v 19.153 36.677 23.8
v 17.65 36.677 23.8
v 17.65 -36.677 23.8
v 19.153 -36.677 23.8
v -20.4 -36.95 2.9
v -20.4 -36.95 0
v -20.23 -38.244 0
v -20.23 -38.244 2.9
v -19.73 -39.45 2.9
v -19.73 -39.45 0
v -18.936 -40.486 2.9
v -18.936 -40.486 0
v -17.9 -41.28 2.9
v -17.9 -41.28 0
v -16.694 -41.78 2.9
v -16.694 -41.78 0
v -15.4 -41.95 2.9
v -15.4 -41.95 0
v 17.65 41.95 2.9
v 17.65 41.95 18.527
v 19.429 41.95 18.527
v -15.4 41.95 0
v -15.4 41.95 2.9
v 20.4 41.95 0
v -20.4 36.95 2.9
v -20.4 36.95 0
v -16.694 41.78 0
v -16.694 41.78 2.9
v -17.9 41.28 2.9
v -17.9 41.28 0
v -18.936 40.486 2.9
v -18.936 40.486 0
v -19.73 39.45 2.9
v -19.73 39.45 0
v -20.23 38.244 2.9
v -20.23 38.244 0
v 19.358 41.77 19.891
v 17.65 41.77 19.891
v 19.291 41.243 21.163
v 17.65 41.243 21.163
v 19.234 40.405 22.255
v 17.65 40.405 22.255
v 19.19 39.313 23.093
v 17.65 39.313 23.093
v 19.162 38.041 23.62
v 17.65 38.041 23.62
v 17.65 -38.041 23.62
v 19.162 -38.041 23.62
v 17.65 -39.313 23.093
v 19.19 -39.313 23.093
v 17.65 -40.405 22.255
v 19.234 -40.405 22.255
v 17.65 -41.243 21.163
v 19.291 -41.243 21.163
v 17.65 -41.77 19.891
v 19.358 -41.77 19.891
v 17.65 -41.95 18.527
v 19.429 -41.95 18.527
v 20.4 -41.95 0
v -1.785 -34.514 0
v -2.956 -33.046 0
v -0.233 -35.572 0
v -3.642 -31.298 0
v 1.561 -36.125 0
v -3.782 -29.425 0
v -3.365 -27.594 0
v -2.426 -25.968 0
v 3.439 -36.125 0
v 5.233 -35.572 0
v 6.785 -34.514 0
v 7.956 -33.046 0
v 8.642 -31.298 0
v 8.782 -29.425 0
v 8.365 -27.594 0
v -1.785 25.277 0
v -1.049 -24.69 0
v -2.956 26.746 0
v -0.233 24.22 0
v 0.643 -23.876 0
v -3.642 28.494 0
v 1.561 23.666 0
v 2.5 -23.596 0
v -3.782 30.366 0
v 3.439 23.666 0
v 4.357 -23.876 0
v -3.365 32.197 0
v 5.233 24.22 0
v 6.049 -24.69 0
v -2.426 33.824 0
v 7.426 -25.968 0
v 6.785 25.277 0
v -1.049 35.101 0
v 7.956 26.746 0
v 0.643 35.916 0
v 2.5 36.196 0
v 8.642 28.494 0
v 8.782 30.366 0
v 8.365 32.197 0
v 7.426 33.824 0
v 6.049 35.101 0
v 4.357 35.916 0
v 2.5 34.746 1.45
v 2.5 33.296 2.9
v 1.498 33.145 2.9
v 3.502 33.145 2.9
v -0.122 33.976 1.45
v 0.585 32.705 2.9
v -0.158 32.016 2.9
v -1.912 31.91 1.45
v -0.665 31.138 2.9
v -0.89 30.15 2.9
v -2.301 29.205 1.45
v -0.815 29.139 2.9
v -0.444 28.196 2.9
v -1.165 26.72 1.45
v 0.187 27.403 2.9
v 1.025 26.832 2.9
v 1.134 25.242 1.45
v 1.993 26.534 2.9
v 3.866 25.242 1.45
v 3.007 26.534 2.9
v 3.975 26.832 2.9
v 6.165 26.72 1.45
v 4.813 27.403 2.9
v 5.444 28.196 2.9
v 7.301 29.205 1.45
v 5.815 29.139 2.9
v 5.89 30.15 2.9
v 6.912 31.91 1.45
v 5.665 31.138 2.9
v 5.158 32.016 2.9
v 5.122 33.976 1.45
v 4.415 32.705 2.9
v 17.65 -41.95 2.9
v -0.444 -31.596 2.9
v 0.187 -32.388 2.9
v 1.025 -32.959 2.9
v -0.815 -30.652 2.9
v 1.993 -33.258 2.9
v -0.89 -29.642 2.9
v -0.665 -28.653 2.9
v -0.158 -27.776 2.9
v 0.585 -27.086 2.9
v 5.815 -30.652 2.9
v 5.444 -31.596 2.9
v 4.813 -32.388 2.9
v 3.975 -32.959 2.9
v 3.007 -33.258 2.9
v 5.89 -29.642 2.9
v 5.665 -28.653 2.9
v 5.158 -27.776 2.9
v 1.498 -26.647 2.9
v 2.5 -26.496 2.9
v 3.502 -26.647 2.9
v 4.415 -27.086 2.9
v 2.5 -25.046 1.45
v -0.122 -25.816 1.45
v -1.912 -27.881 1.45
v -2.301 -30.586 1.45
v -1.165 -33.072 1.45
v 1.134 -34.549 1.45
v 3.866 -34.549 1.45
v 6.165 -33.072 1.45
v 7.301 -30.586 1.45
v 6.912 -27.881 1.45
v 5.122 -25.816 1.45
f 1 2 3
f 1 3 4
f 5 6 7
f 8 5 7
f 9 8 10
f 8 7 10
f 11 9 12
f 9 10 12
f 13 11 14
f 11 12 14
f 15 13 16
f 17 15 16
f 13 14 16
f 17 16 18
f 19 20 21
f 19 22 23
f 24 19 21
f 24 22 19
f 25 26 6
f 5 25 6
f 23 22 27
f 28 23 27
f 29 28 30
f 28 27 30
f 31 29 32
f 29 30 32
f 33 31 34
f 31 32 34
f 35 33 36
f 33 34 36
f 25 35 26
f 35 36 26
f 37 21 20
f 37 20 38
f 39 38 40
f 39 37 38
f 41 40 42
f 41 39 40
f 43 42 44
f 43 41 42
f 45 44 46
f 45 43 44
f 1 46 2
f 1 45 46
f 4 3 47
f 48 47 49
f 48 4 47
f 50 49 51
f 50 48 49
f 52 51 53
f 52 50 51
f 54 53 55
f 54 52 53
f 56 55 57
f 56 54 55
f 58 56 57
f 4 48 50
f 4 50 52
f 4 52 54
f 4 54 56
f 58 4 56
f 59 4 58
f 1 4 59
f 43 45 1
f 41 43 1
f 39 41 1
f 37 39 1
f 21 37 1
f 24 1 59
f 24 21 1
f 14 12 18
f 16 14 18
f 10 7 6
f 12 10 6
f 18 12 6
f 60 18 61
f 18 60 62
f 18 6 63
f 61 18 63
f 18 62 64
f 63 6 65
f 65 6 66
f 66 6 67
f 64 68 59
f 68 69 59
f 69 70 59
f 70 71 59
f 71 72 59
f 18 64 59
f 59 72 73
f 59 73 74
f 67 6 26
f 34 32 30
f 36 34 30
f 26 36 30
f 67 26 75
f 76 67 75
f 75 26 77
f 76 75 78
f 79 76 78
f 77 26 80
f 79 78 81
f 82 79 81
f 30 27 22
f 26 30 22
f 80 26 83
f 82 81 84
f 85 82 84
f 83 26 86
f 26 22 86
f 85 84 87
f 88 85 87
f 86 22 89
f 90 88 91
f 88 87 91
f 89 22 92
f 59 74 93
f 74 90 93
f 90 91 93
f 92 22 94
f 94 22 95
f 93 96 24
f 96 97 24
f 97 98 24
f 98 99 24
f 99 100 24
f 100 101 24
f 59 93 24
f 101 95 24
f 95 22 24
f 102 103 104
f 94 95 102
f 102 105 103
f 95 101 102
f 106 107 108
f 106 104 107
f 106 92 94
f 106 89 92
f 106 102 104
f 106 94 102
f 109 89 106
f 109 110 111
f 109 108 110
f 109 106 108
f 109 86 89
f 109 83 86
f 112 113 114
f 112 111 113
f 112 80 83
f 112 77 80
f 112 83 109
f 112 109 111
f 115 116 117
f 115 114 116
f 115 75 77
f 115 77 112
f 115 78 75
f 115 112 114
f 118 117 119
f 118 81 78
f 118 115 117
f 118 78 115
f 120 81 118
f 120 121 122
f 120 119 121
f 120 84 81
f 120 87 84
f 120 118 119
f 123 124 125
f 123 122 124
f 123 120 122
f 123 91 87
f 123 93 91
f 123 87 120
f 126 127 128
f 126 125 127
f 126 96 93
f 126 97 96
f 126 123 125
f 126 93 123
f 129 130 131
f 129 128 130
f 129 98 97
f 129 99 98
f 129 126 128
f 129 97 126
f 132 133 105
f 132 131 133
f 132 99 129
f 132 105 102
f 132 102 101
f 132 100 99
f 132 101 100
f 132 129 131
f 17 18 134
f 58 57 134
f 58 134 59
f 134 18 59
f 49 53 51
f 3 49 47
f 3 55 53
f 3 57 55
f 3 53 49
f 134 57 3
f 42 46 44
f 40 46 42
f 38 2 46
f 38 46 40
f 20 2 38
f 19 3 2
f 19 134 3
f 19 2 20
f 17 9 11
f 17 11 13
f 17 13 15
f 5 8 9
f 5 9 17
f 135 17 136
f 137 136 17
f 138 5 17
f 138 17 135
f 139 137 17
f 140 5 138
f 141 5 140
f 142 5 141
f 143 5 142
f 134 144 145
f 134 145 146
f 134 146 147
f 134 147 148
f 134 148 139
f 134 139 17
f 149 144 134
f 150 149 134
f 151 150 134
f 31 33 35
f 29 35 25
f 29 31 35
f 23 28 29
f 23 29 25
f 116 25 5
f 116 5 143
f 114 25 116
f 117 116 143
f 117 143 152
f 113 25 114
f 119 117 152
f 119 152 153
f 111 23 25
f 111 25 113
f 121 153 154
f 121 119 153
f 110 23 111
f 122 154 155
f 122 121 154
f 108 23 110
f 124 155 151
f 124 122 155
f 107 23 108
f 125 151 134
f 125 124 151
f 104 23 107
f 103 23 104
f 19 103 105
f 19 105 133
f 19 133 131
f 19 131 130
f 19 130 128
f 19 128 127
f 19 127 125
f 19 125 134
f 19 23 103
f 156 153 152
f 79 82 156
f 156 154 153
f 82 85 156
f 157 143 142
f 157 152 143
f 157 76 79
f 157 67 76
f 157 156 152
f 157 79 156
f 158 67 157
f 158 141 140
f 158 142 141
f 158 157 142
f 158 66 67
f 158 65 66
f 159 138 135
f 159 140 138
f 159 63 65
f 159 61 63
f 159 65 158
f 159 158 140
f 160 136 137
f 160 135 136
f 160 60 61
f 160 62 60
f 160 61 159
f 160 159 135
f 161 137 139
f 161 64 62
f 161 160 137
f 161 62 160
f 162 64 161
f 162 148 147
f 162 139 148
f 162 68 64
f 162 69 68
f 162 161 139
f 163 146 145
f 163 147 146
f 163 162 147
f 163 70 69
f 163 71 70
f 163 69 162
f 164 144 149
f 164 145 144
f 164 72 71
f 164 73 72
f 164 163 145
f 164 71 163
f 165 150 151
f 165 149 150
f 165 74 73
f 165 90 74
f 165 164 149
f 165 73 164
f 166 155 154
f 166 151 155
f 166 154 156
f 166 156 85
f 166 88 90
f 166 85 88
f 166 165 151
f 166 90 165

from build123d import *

# Parameters (mm, degrees)
BOSS_EXTRUDE1_DEPTH                            = 2.9
SKETCH2_W                                      = 2.75
SKETCH2_H                                      = 83.9
BOSS_EXTRUDE2_DEPTH                            = 20.9
CUT_EXTRUDE1_DEPTH                             = 27.75
CSK_FOR_M6_FLAT_HEAD_MACHINE_SCREW1_AT_2_COUNT = 2
CSK_FOR_M6_FLAT_HEAD_MACHINE_SCREW1_AT_2_PITCH = 59.791303716
SKETCH8_W                                      = 41.834673512
SKETCH8_H                                      = 83.9
CUT_REVOLVE4_ANGLE                             = 3


with BuildPart() as part:
    # Sketch1 → Boss-Extrude1 (new body)
    with BuildSketch(Plane.XY):
        with BuildLine():
            Line((-15.4, -41.95), (20.4, -41.95))
            Line((20.4, -41.95), (20.4, 41.95))
            Line((20.4, 41.95), (-15.4, 41.95))
            ThreePointArc((-15.4, 41.95), (-18.935533906, 40.485533906), (-20.4, 36.95))
            Line((-20.4, 36.95), (-20.4, -36.95))
            ThreePointArc((-20.4, -36.95), (-18.935533906, -40.485533906), (-15.4, -41.95))
        make_face()
    extrude(amount=BOSS_EXTRUDE1_DEPTH)

    # Sketch2 → Boss-Extrude2 (add)
    with BuildSketch(Plane.XY.offset(2.9)):
        with Locations((19.025, 0)):
            Rectangle(SKETCH2_W, SKETCH2_H)
    extrude(amount=BOSS_EXTRUDE2_DEPTH)

    # Sketch4 → Cut-Extrude1 (cut)
    with BuildSketch(Plane(origin=(20.4, 0, 0), x_dir=(0, 0, -1), z_dir=(1, 0, 0))):
        with BuildLine():
            Line((-23.8, 36.676506119), (-23.8, 41.95))
            Line((-23.8, 41.95), (-18.526506119, 41.95))
            ThreePointArc((-18.526506119, 41.95), (-22.255429403, 40.405429403), (-23.8, 36.676506119))
        make_face()
        with BuildLine():
            Line((-23.8, -41.95), (-23.8, -36.676506119))
            ThreePointArc((-23.8, -36.676506119), (-22.255429403, -40.405429403), (-18.526506119, -41.95))
            Line((-18.526506119, -41.95), (-23.8, -41.95))
        make_face()
    extrude(amount=-CUT_EXTRUDE1_DEPTH, mode=Mode.SUBTRACT)

    # Sketch6 → CSK for M6 Flat Head Machine Screw1 (revolve, cut)
    with BuildSketch(Plane(origin=(2.5, 29.895651858, 0), x_dir=(0, 1, 0), z_dir=(1, 0, 0))):
        Polygon((0, 0), (0, 2.9), (3.3, 2.9), (3.3, 3), (6.3, 0), align=None)
    csk_for_m6_flat_head_machine_screw1 = revolve(axis=Axis((2.5, 29.895651858, -6.35), (0, 0, 1)), mode=Mode.SUBTRACT)

    # CSK for M6 Flat Head Machine Screw1 at 2: CSK for M6 Flat Head Machine Screw1 ×2
    with Locations(*[(0, -i * CSK_FOR_M6_FLAT_HEAD_MACHINE_SCREW1_AT_2_PITCH, 0) for i in range(1, CSK_FOR_M6_FLAT_HEAD_MACHINE_SCREW1_AT_2_COUNT)]):
        add(csk_for_m6_flat_head_machine_screw1, mode=Mode.SUBTRACT)

    # Sketch8 → Cut-Revolve4 (revolve, cut)
    with BuildSketch(Plane(origin=(20.4, 0, 0), x_dir=(0, 0, -1), z_dir=(1, 0, 0))):
        with Locations((-20.917336756, 0)):
            Rectangle(SKETCH8_W, SKETCH8_H)
    revolve(axis=Axis((20.4, -41.95, 0), (0, -1, 0)), revolution_arc=CUT_REVOLVE4_ANGLE, mode=Mode.SUBTRACT)


solid = part.part
